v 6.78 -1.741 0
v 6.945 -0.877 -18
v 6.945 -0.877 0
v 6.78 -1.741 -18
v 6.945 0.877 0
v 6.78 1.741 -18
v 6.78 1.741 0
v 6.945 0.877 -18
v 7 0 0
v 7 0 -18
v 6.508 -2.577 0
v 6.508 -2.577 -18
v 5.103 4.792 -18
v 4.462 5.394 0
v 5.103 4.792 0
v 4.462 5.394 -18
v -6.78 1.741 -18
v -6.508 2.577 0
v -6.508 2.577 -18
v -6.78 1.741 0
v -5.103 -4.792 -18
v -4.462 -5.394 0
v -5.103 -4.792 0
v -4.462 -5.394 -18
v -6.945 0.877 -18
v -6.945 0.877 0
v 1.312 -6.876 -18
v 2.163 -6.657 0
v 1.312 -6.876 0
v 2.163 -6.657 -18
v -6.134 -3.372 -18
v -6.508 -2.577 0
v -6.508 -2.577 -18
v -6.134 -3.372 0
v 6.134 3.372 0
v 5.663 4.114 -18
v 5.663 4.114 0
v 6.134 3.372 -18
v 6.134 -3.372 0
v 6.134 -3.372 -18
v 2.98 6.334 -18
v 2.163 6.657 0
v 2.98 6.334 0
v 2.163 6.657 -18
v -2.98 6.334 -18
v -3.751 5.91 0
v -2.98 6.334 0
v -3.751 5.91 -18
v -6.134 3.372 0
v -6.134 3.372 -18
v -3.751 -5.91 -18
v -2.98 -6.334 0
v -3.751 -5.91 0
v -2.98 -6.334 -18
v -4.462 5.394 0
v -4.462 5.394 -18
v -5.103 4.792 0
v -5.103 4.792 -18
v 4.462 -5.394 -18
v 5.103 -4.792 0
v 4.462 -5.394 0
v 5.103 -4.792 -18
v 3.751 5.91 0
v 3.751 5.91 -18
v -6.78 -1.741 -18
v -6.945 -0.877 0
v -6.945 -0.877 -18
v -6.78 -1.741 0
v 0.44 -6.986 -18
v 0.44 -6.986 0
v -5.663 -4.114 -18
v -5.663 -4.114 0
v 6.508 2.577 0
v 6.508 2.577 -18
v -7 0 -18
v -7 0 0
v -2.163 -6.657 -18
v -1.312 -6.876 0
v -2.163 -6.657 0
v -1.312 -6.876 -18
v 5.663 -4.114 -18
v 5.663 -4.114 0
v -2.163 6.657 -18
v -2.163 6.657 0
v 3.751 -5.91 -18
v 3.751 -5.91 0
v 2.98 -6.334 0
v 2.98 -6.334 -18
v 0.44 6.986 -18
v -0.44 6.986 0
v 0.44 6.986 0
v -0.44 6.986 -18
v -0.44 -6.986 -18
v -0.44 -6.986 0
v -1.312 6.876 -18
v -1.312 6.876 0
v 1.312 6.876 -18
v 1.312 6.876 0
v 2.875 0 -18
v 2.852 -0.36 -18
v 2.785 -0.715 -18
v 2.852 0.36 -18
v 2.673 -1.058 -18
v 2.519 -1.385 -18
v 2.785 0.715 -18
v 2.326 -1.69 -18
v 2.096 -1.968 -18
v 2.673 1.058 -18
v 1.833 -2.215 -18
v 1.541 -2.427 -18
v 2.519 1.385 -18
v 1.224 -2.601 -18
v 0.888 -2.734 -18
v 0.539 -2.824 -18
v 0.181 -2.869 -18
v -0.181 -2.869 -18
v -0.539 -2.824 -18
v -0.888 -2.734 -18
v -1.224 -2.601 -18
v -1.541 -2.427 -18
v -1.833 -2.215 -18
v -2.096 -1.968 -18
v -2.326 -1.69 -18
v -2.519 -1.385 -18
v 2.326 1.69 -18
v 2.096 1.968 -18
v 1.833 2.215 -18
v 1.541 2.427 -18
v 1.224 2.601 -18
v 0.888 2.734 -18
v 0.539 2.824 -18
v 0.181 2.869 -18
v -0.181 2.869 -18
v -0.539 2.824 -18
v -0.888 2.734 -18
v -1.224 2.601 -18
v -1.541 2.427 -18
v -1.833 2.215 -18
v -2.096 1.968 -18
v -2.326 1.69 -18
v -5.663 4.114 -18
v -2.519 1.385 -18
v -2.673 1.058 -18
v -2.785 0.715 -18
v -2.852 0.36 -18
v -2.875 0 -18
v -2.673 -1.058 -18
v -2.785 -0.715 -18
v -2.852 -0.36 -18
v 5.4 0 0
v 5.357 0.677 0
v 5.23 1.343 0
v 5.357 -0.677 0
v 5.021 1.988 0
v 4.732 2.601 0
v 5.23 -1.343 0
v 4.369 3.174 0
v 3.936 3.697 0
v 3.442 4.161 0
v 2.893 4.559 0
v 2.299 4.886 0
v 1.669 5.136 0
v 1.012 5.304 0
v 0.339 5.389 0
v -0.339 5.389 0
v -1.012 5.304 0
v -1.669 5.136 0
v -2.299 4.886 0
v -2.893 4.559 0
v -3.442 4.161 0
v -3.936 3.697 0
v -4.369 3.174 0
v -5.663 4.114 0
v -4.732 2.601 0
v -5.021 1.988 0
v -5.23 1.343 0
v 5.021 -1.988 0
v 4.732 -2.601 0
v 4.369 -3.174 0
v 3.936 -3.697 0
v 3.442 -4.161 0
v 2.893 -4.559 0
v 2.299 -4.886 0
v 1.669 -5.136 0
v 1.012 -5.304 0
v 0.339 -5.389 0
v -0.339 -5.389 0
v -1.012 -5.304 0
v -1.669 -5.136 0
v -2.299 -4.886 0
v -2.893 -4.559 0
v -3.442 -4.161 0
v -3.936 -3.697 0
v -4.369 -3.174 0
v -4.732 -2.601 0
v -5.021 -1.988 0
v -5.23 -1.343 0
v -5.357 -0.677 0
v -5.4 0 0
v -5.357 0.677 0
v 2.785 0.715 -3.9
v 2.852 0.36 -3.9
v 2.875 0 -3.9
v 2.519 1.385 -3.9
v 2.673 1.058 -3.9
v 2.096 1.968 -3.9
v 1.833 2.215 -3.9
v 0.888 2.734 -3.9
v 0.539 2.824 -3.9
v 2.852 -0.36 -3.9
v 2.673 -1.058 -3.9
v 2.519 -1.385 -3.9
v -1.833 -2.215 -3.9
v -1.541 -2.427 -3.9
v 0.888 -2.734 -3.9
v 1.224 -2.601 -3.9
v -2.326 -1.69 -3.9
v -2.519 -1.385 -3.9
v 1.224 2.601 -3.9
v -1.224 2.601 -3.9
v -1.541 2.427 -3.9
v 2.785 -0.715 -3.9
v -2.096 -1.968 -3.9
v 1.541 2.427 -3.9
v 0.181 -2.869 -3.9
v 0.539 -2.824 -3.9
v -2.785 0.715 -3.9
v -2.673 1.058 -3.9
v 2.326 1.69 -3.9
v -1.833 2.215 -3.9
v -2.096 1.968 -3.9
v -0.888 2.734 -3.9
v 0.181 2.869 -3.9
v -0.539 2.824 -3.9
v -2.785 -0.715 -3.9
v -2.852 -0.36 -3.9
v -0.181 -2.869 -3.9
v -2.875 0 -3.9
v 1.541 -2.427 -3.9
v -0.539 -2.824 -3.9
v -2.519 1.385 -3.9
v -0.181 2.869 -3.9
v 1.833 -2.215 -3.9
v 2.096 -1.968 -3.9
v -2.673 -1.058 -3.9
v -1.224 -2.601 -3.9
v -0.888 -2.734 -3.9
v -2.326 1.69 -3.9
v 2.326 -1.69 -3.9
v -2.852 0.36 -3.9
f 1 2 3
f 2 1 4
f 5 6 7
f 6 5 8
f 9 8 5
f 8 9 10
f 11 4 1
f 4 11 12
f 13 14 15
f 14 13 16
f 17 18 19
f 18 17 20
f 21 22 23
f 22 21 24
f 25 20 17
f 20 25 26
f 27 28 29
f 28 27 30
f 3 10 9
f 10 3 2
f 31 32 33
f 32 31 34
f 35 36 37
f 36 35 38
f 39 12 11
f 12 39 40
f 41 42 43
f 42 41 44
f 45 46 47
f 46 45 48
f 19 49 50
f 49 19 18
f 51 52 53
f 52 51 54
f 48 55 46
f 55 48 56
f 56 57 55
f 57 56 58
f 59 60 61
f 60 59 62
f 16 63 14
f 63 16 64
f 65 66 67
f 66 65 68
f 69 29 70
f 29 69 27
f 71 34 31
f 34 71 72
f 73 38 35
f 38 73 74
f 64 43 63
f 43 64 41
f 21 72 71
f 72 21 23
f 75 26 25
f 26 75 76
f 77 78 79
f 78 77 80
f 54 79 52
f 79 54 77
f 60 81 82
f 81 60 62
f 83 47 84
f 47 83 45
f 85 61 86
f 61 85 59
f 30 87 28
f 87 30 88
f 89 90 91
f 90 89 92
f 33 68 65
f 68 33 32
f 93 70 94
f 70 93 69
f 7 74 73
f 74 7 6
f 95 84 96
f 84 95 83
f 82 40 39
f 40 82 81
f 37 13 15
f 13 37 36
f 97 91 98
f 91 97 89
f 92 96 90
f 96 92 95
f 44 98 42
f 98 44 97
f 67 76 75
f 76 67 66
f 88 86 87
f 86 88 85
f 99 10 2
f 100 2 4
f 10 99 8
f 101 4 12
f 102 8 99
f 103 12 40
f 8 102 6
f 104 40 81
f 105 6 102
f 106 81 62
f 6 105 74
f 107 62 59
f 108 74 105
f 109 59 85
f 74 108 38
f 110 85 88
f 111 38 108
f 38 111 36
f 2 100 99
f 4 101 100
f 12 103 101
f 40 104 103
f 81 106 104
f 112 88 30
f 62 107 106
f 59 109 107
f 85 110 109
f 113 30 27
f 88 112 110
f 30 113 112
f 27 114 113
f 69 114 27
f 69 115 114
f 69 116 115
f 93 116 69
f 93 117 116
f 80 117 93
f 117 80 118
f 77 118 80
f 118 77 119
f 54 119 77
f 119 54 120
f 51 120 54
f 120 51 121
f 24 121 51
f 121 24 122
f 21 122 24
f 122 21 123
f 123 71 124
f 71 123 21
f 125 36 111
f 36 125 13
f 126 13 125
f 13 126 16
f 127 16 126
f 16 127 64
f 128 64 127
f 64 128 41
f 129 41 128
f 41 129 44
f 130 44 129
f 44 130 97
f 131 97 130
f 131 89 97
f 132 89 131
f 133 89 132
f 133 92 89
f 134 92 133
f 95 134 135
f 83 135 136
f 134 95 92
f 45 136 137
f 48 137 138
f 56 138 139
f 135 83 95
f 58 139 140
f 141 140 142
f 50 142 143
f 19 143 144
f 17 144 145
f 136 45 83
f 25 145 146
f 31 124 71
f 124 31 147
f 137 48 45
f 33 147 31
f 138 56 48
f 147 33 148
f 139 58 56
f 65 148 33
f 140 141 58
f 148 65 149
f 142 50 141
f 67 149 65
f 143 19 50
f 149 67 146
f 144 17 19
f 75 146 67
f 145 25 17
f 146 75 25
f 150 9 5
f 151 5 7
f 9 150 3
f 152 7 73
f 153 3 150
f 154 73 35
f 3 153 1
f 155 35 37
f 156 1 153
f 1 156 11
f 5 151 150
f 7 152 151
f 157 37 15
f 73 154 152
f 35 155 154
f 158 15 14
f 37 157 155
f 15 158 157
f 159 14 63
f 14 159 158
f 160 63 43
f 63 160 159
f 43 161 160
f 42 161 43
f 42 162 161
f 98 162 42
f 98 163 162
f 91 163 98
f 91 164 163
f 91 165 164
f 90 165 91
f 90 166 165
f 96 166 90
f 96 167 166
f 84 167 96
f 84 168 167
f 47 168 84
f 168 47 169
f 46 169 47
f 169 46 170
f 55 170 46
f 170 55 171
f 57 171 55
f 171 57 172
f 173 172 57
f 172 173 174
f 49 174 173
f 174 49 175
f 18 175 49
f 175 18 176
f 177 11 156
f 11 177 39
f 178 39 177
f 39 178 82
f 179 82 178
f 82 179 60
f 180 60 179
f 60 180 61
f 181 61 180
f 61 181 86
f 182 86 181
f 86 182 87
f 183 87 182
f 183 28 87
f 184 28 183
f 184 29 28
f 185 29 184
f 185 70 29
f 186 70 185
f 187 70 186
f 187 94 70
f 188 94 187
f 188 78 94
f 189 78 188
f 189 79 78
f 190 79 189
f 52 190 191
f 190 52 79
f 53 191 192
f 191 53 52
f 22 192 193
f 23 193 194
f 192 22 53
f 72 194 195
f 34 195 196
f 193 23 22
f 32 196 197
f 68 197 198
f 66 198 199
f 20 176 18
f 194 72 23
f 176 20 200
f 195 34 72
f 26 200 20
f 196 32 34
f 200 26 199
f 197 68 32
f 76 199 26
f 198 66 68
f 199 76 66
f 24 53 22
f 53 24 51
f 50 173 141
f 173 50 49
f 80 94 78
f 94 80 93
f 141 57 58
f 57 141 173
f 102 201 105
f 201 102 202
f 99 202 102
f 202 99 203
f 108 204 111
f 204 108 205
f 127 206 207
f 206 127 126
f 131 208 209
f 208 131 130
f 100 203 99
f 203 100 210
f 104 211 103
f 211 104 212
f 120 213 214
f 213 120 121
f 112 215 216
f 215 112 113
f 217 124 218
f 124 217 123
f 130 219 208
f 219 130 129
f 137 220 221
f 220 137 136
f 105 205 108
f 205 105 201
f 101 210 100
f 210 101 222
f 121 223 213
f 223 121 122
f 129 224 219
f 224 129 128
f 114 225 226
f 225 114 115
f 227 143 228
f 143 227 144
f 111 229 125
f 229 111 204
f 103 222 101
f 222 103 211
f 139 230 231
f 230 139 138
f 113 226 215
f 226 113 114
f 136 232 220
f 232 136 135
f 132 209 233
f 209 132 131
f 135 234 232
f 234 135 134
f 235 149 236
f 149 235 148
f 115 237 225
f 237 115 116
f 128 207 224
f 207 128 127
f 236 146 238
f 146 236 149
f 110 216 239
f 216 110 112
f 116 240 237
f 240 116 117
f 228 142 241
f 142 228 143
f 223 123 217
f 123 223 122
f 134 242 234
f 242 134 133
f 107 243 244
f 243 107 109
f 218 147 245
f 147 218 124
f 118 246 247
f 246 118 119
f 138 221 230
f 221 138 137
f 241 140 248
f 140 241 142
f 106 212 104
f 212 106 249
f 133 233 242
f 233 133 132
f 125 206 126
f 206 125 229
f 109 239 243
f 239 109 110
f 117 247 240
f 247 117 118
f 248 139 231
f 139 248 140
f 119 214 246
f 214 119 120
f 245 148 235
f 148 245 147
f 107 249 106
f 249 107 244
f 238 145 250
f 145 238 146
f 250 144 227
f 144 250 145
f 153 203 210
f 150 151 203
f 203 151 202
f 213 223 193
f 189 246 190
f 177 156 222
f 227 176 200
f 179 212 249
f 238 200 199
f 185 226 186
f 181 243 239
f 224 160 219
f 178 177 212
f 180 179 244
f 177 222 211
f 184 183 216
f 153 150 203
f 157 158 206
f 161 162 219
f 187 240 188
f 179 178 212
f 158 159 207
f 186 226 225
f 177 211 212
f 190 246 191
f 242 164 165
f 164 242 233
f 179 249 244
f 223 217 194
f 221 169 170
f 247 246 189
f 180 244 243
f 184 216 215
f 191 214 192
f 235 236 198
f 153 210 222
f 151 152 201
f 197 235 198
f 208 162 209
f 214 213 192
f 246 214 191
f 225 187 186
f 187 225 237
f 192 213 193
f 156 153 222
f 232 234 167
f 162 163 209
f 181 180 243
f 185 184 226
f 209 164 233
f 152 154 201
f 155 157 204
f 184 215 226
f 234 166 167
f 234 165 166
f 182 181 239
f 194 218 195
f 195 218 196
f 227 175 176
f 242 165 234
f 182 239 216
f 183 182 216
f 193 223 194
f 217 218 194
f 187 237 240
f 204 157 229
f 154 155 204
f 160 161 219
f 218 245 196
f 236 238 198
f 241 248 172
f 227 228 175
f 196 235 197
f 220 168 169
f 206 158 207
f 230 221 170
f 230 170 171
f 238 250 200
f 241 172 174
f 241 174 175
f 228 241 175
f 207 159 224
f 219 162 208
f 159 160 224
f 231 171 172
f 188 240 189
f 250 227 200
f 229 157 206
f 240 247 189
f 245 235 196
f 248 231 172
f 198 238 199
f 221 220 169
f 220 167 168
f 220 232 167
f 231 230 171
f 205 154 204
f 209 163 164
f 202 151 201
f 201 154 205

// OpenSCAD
$fn = 50;

difference() {
	union() {
		translate(v = [0, 0, -18.0]) {
			cylinder(h = 18, r = 7.0);
		}
		#translate(v = [0, 0, -21.0]) {
			cylinder(h = 21, r = 2.875);
		}
	}
	union() {
		translate(v = [0, 0, 0]) {
			rotate(a = [0, 0, 0]) {
				difference() {
					union() {
						translate(v = [0, 0, -21.0]) {
							cylinder(h = 21, r = 2.6);
						}
						translate(v = [0, 0, -3.9]) {
							cylinder(h = 3.9, r1 = 2.875, r2 = 5.4);
						}
						translate(v = [0, 0, -21.0]) {
							cylinder(h = 21, r = 2.875);
						}
						translate(v = [0, 0, -21.0]) {
							cylinder(h = 21, r = 2.6);
						}
					}
					union();
				}
			}
		}
	}
}
